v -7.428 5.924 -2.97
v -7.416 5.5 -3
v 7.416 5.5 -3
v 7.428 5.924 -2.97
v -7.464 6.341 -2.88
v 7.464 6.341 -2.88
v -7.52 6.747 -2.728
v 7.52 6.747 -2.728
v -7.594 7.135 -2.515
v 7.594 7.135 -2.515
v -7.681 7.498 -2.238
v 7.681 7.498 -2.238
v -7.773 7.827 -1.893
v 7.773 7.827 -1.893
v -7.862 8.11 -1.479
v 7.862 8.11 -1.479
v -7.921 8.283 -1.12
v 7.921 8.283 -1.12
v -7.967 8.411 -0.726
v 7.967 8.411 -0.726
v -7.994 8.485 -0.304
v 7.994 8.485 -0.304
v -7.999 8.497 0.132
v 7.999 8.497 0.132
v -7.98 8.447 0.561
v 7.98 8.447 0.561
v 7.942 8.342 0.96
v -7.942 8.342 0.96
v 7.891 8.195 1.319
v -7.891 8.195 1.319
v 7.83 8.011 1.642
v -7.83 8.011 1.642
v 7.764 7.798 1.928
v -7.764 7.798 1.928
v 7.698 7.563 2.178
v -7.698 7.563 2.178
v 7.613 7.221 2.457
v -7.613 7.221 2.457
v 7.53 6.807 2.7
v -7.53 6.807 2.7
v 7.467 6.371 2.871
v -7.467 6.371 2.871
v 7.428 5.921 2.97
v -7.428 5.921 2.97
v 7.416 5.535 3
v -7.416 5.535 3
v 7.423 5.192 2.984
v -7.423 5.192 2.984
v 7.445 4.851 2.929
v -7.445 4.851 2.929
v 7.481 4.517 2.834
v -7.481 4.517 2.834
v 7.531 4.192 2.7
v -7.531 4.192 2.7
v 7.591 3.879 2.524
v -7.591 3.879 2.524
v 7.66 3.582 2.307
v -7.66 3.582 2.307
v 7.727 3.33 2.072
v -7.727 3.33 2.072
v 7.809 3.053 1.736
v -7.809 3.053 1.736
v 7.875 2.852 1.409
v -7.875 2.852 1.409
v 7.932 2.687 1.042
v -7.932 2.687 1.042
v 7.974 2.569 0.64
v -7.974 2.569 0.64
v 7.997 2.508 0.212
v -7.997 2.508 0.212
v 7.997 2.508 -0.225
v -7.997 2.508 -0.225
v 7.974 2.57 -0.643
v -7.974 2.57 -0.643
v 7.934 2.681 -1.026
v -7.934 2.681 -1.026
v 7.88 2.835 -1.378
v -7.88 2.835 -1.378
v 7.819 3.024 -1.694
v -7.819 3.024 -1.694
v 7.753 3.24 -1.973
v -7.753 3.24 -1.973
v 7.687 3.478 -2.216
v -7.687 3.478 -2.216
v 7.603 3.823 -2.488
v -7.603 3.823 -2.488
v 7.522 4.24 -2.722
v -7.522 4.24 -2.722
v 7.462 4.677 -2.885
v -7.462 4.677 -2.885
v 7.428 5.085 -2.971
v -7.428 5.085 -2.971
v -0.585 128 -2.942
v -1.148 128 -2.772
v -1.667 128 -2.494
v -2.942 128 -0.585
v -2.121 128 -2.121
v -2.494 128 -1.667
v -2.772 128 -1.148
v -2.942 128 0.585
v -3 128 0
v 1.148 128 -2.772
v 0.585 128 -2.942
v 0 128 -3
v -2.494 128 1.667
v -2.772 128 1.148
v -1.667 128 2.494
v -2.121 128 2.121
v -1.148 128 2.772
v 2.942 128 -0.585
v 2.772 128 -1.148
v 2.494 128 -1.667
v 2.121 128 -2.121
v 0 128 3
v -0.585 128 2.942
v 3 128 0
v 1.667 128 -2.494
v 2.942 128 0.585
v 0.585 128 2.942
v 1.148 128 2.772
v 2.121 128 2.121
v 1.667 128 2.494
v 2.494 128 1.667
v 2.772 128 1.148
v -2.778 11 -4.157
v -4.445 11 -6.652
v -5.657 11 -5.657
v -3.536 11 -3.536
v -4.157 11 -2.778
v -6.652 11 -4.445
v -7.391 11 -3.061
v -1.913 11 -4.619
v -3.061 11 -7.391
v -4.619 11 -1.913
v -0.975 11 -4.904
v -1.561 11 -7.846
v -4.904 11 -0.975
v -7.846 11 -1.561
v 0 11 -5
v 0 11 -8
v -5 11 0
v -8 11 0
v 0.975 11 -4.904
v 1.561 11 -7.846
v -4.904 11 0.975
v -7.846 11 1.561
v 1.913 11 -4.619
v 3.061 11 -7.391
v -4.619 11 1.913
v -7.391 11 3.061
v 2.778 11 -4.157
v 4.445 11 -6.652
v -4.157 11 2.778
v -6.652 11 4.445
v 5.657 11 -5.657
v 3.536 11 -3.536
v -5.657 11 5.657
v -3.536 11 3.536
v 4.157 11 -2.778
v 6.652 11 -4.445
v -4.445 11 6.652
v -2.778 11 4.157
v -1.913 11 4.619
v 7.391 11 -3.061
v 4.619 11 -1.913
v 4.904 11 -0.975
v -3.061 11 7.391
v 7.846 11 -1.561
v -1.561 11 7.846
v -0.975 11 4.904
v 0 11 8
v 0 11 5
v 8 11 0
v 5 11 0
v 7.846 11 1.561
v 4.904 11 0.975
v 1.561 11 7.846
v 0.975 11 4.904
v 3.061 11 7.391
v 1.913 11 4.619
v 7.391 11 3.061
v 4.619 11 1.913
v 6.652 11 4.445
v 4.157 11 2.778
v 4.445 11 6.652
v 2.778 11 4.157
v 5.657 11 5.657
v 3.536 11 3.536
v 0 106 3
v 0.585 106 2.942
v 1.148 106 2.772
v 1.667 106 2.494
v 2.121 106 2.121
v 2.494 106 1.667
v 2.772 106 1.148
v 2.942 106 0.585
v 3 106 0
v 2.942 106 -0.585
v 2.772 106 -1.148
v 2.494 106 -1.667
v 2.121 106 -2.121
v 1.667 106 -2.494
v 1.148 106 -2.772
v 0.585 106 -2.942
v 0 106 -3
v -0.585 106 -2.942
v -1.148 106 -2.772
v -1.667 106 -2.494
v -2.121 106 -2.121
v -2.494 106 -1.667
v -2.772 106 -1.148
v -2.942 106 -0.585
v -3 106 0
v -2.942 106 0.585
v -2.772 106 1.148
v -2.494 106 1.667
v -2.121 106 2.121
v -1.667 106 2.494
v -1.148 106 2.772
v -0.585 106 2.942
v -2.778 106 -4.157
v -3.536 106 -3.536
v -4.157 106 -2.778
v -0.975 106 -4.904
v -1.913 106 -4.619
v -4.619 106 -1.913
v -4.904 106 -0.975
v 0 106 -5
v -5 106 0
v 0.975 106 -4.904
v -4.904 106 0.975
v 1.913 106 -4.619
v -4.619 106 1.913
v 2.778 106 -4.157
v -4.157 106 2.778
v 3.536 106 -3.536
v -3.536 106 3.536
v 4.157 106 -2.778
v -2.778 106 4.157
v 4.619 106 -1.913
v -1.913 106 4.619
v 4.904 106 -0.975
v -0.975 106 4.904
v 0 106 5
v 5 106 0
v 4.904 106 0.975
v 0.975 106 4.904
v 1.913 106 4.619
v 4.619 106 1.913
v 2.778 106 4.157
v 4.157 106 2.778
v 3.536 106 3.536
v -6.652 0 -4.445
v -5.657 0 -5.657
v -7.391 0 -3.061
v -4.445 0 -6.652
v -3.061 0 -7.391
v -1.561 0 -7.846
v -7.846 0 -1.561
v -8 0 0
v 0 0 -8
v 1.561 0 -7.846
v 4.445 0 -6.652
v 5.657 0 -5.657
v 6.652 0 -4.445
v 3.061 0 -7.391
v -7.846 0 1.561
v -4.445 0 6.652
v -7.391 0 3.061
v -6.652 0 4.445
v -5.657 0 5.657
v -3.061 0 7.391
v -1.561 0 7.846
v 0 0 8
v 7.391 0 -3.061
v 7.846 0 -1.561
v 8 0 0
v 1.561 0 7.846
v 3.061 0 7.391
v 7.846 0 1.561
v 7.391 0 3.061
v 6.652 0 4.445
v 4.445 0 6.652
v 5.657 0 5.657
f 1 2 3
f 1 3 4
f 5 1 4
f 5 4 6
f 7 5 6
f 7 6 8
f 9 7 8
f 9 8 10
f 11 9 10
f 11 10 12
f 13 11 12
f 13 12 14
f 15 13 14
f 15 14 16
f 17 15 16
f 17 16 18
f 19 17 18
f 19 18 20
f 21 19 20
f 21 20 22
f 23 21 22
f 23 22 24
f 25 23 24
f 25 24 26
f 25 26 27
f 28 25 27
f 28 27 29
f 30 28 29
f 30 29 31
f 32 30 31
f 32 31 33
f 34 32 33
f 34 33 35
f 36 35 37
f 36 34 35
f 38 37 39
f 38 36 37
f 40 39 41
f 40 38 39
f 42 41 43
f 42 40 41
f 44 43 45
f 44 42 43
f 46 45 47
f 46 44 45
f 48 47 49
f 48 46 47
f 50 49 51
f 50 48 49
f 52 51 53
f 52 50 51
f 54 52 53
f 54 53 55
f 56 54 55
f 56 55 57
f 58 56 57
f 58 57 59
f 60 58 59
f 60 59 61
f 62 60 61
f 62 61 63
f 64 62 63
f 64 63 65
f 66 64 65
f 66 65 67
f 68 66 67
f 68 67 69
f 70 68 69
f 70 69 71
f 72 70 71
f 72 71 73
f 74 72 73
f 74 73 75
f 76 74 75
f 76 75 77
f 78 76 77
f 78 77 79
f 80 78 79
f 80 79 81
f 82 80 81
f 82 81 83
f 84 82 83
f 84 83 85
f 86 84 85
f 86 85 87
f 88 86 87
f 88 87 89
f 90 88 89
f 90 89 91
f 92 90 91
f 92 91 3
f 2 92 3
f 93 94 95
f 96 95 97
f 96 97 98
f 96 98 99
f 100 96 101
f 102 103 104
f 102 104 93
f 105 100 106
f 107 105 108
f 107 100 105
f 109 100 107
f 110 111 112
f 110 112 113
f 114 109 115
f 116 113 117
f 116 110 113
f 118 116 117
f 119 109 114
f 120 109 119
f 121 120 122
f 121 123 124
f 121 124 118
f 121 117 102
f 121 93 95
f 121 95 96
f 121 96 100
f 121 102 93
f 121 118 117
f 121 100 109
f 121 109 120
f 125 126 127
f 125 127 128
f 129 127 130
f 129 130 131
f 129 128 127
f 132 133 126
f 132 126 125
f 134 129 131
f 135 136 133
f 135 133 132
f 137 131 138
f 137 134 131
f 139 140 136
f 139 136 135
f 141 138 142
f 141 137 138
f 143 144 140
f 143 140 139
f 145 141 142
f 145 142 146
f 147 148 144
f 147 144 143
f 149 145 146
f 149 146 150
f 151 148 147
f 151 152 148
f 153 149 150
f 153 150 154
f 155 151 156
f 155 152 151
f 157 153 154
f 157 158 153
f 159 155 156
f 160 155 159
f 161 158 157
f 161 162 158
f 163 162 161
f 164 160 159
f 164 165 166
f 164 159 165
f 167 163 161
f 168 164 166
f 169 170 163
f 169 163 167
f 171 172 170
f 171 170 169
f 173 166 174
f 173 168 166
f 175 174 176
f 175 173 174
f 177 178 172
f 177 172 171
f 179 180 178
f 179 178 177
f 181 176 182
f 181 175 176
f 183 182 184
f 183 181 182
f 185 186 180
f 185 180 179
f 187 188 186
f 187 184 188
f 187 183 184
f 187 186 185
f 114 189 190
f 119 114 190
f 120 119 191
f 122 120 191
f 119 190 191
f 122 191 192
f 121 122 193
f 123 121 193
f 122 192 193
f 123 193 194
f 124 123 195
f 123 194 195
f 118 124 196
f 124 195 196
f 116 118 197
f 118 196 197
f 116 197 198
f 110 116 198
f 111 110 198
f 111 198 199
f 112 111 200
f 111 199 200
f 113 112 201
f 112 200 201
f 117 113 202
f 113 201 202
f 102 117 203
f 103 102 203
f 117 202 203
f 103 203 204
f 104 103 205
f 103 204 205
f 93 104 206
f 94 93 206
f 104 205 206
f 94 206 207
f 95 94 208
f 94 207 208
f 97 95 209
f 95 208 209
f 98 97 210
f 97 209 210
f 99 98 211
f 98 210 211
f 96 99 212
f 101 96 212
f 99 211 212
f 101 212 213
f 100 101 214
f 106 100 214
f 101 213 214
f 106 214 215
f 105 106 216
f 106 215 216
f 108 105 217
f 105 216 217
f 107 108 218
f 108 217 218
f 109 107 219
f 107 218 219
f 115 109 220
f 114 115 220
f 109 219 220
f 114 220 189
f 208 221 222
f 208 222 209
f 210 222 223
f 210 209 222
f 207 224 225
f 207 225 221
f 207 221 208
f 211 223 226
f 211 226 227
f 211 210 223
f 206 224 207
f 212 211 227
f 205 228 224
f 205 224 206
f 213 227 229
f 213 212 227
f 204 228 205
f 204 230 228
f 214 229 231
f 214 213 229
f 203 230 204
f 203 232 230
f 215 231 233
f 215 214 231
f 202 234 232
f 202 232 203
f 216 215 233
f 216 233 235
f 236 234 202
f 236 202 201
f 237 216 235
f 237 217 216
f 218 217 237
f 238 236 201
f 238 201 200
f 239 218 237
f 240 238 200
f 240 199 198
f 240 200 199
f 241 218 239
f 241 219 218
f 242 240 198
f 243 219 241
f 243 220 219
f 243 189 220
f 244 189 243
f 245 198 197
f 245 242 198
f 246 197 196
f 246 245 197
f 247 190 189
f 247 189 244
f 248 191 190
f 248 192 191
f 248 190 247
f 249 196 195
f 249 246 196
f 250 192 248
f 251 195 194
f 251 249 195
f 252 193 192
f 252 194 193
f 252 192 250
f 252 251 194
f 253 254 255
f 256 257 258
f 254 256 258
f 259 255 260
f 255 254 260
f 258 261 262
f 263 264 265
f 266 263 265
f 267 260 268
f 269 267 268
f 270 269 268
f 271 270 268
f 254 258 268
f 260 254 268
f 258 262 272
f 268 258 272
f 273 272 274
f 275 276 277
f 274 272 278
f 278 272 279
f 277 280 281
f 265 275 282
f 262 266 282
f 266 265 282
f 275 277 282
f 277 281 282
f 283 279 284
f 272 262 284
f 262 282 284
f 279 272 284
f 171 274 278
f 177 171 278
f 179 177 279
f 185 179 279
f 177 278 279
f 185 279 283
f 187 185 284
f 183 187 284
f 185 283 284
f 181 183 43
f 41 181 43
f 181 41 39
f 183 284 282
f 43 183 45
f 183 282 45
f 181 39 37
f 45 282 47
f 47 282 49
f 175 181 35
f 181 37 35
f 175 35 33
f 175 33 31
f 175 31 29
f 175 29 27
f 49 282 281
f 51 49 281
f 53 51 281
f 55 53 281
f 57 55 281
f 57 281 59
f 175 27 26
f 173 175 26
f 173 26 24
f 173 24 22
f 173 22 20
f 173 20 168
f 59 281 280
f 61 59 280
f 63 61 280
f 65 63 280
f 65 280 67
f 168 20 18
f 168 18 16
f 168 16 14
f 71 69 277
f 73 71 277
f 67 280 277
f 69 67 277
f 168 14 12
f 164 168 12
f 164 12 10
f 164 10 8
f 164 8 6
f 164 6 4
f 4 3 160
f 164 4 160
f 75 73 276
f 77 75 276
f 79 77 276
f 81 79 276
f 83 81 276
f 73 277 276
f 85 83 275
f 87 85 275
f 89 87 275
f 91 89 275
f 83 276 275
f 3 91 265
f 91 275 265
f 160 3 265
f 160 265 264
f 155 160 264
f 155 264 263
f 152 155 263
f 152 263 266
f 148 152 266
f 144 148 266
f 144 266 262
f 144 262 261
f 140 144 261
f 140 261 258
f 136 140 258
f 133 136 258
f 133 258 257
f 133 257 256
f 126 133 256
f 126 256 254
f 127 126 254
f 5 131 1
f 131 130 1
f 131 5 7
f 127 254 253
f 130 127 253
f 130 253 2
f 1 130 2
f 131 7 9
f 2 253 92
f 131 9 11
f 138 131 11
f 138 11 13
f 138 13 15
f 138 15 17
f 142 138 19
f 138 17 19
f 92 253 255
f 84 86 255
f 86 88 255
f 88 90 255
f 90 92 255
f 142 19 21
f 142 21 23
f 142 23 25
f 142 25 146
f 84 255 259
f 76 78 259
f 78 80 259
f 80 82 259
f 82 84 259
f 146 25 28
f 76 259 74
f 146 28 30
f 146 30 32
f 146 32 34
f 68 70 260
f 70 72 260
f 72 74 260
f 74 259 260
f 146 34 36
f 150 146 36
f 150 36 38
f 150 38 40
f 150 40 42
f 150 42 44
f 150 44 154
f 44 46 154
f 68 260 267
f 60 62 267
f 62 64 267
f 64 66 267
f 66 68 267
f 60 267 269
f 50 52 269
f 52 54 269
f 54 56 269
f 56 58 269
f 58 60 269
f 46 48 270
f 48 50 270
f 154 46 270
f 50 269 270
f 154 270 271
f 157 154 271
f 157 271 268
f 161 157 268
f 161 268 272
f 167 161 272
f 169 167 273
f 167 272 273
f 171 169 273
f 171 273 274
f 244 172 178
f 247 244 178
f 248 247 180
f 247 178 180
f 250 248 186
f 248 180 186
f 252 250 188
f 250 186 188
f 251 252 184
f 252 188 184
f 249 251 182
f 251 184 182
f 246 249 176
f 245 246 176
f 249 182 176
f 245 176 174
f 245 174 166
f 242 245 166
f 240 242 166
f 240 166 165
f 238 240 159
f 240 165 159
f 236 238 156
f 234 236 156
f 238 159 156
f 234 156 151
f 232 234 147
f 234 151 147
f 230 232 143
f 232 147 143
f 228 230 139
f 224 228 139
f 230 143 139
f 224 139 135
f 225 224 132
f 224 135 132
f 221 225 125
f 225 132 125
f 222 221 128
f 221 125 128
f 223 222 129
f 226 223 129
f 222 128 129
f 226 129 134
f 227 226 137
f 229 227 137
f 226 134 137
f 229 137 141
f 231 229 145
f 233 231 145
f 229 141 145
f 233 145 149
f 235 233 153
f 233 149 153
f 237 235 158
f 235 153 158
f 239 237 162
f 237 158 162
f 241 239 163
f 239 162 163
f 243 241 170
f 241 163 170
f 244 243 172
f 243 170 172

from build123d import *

# Parameters (mm, degrees)
SCHIZZO1_R                    = 8
ESTRUSIONE_ESTRUSIONE1_DEPTH  = 128
TAGLIO_ESTRUSIONE1_START      = -22
SCHIZZO2_R                    = 8
SCHIZZO2_R_2                  = 3
TAGLIO_ESTRUSIONE1_DEPTH      = 22
TAGLIO_ESTRUSIONE2_START      = -95
SCHIZZO5_R                    = 8
SCHIZZO5_R_2                  = 5
TAGLIO_ESTRUSIONE2_DEPTH      = 95
TAGLIO_ESTRUSIONE3_DEPTH      = 129.499027234
TAGLIO_ESTRUSIONE3_DEPTH_BACK = 129.499027234
SCHIZZO9_R                    = 3


with BuildPart() as part:
    # Schizzo1 → Estrusione-Estrusione1 (new body)
    with BuildSketch(Plane(origin=(0, 0, 0), x_dir=(1, 0, 0), z_dir=(0, 1, 0))):
        with Locations(Location((0, 0, 0), (0, 0, 270))):
            Circle(SCHIZZO1_R)
    extrude(amount=ESTRUSIONE_ESTRUSIONE1_DEPTH)

    # Schizzo2 → Taglio-Estrusione1 (cut)
    with BuildSketch(Plane(origin=(0, 128, 0), x_dir=(1, 0, 0), z_dir=(0, 1, 0)).offset(TAGLIO_ESTRUSIONE1_START)):
        with Locations(Location((0, 0, 0), (0, 0, 270))):
            Circle(SCHIZZO2_R)
        with Locations(Location((0, 0, 0), (0, 0, 270))):
            Circle(SCHIZZO2_R_2, mode=Mode.SUBTRACT)
    extrude(amount=TAGLIO_ESTRUSIONE1_DEPTH, mode=Mode.SUBTRACT)

    # Schizzo5 → Taglio-Estrusione2 (cut)
    with BuildSketch(Plane(origin=(0, 106, 0), x_dir=(1, 0, 0), z_dir=(0, 1, 0)).offset(TAGLIO_ESTRUSIONE2_START)):
        with Locations(Location((0, 0, 0), (0, 0, 270))):
            Circle(SCHIZZO5_R)
        with Locations(Location((0, 0, 0), (0, 0, 270))):
            Circle(SCHIZZO5_R_2, mode=Mode.SUBTRACT)
    extrude(amount=TAGLIO_ESTRUSIONE2_DEPTH, mode=Mode.SUBTRACT)

    # Schizzo9 → Taglio-Estrusione3 (cut, two sides: drawn at the far end of the back side and taken through both)
    with BuildSketch(Plane(origin=(0, 0, 0), x_dir=(0, 0, -1), z_dir=(1, 0, 0)).offset(-TAGLIO_ESTRUSIONE3_DEPTH_BACK)):
        with Locations((0, 5.5)):
            Circle(SCHIZZO9_R)
    extrude(amount=TAGLIO_ESTRUSIONE3_DEPTH + TAGLIO_ESTRUSIONE3_DEPTH_BACK, mode=Mode.SUBTRACT)


solid = part.part
